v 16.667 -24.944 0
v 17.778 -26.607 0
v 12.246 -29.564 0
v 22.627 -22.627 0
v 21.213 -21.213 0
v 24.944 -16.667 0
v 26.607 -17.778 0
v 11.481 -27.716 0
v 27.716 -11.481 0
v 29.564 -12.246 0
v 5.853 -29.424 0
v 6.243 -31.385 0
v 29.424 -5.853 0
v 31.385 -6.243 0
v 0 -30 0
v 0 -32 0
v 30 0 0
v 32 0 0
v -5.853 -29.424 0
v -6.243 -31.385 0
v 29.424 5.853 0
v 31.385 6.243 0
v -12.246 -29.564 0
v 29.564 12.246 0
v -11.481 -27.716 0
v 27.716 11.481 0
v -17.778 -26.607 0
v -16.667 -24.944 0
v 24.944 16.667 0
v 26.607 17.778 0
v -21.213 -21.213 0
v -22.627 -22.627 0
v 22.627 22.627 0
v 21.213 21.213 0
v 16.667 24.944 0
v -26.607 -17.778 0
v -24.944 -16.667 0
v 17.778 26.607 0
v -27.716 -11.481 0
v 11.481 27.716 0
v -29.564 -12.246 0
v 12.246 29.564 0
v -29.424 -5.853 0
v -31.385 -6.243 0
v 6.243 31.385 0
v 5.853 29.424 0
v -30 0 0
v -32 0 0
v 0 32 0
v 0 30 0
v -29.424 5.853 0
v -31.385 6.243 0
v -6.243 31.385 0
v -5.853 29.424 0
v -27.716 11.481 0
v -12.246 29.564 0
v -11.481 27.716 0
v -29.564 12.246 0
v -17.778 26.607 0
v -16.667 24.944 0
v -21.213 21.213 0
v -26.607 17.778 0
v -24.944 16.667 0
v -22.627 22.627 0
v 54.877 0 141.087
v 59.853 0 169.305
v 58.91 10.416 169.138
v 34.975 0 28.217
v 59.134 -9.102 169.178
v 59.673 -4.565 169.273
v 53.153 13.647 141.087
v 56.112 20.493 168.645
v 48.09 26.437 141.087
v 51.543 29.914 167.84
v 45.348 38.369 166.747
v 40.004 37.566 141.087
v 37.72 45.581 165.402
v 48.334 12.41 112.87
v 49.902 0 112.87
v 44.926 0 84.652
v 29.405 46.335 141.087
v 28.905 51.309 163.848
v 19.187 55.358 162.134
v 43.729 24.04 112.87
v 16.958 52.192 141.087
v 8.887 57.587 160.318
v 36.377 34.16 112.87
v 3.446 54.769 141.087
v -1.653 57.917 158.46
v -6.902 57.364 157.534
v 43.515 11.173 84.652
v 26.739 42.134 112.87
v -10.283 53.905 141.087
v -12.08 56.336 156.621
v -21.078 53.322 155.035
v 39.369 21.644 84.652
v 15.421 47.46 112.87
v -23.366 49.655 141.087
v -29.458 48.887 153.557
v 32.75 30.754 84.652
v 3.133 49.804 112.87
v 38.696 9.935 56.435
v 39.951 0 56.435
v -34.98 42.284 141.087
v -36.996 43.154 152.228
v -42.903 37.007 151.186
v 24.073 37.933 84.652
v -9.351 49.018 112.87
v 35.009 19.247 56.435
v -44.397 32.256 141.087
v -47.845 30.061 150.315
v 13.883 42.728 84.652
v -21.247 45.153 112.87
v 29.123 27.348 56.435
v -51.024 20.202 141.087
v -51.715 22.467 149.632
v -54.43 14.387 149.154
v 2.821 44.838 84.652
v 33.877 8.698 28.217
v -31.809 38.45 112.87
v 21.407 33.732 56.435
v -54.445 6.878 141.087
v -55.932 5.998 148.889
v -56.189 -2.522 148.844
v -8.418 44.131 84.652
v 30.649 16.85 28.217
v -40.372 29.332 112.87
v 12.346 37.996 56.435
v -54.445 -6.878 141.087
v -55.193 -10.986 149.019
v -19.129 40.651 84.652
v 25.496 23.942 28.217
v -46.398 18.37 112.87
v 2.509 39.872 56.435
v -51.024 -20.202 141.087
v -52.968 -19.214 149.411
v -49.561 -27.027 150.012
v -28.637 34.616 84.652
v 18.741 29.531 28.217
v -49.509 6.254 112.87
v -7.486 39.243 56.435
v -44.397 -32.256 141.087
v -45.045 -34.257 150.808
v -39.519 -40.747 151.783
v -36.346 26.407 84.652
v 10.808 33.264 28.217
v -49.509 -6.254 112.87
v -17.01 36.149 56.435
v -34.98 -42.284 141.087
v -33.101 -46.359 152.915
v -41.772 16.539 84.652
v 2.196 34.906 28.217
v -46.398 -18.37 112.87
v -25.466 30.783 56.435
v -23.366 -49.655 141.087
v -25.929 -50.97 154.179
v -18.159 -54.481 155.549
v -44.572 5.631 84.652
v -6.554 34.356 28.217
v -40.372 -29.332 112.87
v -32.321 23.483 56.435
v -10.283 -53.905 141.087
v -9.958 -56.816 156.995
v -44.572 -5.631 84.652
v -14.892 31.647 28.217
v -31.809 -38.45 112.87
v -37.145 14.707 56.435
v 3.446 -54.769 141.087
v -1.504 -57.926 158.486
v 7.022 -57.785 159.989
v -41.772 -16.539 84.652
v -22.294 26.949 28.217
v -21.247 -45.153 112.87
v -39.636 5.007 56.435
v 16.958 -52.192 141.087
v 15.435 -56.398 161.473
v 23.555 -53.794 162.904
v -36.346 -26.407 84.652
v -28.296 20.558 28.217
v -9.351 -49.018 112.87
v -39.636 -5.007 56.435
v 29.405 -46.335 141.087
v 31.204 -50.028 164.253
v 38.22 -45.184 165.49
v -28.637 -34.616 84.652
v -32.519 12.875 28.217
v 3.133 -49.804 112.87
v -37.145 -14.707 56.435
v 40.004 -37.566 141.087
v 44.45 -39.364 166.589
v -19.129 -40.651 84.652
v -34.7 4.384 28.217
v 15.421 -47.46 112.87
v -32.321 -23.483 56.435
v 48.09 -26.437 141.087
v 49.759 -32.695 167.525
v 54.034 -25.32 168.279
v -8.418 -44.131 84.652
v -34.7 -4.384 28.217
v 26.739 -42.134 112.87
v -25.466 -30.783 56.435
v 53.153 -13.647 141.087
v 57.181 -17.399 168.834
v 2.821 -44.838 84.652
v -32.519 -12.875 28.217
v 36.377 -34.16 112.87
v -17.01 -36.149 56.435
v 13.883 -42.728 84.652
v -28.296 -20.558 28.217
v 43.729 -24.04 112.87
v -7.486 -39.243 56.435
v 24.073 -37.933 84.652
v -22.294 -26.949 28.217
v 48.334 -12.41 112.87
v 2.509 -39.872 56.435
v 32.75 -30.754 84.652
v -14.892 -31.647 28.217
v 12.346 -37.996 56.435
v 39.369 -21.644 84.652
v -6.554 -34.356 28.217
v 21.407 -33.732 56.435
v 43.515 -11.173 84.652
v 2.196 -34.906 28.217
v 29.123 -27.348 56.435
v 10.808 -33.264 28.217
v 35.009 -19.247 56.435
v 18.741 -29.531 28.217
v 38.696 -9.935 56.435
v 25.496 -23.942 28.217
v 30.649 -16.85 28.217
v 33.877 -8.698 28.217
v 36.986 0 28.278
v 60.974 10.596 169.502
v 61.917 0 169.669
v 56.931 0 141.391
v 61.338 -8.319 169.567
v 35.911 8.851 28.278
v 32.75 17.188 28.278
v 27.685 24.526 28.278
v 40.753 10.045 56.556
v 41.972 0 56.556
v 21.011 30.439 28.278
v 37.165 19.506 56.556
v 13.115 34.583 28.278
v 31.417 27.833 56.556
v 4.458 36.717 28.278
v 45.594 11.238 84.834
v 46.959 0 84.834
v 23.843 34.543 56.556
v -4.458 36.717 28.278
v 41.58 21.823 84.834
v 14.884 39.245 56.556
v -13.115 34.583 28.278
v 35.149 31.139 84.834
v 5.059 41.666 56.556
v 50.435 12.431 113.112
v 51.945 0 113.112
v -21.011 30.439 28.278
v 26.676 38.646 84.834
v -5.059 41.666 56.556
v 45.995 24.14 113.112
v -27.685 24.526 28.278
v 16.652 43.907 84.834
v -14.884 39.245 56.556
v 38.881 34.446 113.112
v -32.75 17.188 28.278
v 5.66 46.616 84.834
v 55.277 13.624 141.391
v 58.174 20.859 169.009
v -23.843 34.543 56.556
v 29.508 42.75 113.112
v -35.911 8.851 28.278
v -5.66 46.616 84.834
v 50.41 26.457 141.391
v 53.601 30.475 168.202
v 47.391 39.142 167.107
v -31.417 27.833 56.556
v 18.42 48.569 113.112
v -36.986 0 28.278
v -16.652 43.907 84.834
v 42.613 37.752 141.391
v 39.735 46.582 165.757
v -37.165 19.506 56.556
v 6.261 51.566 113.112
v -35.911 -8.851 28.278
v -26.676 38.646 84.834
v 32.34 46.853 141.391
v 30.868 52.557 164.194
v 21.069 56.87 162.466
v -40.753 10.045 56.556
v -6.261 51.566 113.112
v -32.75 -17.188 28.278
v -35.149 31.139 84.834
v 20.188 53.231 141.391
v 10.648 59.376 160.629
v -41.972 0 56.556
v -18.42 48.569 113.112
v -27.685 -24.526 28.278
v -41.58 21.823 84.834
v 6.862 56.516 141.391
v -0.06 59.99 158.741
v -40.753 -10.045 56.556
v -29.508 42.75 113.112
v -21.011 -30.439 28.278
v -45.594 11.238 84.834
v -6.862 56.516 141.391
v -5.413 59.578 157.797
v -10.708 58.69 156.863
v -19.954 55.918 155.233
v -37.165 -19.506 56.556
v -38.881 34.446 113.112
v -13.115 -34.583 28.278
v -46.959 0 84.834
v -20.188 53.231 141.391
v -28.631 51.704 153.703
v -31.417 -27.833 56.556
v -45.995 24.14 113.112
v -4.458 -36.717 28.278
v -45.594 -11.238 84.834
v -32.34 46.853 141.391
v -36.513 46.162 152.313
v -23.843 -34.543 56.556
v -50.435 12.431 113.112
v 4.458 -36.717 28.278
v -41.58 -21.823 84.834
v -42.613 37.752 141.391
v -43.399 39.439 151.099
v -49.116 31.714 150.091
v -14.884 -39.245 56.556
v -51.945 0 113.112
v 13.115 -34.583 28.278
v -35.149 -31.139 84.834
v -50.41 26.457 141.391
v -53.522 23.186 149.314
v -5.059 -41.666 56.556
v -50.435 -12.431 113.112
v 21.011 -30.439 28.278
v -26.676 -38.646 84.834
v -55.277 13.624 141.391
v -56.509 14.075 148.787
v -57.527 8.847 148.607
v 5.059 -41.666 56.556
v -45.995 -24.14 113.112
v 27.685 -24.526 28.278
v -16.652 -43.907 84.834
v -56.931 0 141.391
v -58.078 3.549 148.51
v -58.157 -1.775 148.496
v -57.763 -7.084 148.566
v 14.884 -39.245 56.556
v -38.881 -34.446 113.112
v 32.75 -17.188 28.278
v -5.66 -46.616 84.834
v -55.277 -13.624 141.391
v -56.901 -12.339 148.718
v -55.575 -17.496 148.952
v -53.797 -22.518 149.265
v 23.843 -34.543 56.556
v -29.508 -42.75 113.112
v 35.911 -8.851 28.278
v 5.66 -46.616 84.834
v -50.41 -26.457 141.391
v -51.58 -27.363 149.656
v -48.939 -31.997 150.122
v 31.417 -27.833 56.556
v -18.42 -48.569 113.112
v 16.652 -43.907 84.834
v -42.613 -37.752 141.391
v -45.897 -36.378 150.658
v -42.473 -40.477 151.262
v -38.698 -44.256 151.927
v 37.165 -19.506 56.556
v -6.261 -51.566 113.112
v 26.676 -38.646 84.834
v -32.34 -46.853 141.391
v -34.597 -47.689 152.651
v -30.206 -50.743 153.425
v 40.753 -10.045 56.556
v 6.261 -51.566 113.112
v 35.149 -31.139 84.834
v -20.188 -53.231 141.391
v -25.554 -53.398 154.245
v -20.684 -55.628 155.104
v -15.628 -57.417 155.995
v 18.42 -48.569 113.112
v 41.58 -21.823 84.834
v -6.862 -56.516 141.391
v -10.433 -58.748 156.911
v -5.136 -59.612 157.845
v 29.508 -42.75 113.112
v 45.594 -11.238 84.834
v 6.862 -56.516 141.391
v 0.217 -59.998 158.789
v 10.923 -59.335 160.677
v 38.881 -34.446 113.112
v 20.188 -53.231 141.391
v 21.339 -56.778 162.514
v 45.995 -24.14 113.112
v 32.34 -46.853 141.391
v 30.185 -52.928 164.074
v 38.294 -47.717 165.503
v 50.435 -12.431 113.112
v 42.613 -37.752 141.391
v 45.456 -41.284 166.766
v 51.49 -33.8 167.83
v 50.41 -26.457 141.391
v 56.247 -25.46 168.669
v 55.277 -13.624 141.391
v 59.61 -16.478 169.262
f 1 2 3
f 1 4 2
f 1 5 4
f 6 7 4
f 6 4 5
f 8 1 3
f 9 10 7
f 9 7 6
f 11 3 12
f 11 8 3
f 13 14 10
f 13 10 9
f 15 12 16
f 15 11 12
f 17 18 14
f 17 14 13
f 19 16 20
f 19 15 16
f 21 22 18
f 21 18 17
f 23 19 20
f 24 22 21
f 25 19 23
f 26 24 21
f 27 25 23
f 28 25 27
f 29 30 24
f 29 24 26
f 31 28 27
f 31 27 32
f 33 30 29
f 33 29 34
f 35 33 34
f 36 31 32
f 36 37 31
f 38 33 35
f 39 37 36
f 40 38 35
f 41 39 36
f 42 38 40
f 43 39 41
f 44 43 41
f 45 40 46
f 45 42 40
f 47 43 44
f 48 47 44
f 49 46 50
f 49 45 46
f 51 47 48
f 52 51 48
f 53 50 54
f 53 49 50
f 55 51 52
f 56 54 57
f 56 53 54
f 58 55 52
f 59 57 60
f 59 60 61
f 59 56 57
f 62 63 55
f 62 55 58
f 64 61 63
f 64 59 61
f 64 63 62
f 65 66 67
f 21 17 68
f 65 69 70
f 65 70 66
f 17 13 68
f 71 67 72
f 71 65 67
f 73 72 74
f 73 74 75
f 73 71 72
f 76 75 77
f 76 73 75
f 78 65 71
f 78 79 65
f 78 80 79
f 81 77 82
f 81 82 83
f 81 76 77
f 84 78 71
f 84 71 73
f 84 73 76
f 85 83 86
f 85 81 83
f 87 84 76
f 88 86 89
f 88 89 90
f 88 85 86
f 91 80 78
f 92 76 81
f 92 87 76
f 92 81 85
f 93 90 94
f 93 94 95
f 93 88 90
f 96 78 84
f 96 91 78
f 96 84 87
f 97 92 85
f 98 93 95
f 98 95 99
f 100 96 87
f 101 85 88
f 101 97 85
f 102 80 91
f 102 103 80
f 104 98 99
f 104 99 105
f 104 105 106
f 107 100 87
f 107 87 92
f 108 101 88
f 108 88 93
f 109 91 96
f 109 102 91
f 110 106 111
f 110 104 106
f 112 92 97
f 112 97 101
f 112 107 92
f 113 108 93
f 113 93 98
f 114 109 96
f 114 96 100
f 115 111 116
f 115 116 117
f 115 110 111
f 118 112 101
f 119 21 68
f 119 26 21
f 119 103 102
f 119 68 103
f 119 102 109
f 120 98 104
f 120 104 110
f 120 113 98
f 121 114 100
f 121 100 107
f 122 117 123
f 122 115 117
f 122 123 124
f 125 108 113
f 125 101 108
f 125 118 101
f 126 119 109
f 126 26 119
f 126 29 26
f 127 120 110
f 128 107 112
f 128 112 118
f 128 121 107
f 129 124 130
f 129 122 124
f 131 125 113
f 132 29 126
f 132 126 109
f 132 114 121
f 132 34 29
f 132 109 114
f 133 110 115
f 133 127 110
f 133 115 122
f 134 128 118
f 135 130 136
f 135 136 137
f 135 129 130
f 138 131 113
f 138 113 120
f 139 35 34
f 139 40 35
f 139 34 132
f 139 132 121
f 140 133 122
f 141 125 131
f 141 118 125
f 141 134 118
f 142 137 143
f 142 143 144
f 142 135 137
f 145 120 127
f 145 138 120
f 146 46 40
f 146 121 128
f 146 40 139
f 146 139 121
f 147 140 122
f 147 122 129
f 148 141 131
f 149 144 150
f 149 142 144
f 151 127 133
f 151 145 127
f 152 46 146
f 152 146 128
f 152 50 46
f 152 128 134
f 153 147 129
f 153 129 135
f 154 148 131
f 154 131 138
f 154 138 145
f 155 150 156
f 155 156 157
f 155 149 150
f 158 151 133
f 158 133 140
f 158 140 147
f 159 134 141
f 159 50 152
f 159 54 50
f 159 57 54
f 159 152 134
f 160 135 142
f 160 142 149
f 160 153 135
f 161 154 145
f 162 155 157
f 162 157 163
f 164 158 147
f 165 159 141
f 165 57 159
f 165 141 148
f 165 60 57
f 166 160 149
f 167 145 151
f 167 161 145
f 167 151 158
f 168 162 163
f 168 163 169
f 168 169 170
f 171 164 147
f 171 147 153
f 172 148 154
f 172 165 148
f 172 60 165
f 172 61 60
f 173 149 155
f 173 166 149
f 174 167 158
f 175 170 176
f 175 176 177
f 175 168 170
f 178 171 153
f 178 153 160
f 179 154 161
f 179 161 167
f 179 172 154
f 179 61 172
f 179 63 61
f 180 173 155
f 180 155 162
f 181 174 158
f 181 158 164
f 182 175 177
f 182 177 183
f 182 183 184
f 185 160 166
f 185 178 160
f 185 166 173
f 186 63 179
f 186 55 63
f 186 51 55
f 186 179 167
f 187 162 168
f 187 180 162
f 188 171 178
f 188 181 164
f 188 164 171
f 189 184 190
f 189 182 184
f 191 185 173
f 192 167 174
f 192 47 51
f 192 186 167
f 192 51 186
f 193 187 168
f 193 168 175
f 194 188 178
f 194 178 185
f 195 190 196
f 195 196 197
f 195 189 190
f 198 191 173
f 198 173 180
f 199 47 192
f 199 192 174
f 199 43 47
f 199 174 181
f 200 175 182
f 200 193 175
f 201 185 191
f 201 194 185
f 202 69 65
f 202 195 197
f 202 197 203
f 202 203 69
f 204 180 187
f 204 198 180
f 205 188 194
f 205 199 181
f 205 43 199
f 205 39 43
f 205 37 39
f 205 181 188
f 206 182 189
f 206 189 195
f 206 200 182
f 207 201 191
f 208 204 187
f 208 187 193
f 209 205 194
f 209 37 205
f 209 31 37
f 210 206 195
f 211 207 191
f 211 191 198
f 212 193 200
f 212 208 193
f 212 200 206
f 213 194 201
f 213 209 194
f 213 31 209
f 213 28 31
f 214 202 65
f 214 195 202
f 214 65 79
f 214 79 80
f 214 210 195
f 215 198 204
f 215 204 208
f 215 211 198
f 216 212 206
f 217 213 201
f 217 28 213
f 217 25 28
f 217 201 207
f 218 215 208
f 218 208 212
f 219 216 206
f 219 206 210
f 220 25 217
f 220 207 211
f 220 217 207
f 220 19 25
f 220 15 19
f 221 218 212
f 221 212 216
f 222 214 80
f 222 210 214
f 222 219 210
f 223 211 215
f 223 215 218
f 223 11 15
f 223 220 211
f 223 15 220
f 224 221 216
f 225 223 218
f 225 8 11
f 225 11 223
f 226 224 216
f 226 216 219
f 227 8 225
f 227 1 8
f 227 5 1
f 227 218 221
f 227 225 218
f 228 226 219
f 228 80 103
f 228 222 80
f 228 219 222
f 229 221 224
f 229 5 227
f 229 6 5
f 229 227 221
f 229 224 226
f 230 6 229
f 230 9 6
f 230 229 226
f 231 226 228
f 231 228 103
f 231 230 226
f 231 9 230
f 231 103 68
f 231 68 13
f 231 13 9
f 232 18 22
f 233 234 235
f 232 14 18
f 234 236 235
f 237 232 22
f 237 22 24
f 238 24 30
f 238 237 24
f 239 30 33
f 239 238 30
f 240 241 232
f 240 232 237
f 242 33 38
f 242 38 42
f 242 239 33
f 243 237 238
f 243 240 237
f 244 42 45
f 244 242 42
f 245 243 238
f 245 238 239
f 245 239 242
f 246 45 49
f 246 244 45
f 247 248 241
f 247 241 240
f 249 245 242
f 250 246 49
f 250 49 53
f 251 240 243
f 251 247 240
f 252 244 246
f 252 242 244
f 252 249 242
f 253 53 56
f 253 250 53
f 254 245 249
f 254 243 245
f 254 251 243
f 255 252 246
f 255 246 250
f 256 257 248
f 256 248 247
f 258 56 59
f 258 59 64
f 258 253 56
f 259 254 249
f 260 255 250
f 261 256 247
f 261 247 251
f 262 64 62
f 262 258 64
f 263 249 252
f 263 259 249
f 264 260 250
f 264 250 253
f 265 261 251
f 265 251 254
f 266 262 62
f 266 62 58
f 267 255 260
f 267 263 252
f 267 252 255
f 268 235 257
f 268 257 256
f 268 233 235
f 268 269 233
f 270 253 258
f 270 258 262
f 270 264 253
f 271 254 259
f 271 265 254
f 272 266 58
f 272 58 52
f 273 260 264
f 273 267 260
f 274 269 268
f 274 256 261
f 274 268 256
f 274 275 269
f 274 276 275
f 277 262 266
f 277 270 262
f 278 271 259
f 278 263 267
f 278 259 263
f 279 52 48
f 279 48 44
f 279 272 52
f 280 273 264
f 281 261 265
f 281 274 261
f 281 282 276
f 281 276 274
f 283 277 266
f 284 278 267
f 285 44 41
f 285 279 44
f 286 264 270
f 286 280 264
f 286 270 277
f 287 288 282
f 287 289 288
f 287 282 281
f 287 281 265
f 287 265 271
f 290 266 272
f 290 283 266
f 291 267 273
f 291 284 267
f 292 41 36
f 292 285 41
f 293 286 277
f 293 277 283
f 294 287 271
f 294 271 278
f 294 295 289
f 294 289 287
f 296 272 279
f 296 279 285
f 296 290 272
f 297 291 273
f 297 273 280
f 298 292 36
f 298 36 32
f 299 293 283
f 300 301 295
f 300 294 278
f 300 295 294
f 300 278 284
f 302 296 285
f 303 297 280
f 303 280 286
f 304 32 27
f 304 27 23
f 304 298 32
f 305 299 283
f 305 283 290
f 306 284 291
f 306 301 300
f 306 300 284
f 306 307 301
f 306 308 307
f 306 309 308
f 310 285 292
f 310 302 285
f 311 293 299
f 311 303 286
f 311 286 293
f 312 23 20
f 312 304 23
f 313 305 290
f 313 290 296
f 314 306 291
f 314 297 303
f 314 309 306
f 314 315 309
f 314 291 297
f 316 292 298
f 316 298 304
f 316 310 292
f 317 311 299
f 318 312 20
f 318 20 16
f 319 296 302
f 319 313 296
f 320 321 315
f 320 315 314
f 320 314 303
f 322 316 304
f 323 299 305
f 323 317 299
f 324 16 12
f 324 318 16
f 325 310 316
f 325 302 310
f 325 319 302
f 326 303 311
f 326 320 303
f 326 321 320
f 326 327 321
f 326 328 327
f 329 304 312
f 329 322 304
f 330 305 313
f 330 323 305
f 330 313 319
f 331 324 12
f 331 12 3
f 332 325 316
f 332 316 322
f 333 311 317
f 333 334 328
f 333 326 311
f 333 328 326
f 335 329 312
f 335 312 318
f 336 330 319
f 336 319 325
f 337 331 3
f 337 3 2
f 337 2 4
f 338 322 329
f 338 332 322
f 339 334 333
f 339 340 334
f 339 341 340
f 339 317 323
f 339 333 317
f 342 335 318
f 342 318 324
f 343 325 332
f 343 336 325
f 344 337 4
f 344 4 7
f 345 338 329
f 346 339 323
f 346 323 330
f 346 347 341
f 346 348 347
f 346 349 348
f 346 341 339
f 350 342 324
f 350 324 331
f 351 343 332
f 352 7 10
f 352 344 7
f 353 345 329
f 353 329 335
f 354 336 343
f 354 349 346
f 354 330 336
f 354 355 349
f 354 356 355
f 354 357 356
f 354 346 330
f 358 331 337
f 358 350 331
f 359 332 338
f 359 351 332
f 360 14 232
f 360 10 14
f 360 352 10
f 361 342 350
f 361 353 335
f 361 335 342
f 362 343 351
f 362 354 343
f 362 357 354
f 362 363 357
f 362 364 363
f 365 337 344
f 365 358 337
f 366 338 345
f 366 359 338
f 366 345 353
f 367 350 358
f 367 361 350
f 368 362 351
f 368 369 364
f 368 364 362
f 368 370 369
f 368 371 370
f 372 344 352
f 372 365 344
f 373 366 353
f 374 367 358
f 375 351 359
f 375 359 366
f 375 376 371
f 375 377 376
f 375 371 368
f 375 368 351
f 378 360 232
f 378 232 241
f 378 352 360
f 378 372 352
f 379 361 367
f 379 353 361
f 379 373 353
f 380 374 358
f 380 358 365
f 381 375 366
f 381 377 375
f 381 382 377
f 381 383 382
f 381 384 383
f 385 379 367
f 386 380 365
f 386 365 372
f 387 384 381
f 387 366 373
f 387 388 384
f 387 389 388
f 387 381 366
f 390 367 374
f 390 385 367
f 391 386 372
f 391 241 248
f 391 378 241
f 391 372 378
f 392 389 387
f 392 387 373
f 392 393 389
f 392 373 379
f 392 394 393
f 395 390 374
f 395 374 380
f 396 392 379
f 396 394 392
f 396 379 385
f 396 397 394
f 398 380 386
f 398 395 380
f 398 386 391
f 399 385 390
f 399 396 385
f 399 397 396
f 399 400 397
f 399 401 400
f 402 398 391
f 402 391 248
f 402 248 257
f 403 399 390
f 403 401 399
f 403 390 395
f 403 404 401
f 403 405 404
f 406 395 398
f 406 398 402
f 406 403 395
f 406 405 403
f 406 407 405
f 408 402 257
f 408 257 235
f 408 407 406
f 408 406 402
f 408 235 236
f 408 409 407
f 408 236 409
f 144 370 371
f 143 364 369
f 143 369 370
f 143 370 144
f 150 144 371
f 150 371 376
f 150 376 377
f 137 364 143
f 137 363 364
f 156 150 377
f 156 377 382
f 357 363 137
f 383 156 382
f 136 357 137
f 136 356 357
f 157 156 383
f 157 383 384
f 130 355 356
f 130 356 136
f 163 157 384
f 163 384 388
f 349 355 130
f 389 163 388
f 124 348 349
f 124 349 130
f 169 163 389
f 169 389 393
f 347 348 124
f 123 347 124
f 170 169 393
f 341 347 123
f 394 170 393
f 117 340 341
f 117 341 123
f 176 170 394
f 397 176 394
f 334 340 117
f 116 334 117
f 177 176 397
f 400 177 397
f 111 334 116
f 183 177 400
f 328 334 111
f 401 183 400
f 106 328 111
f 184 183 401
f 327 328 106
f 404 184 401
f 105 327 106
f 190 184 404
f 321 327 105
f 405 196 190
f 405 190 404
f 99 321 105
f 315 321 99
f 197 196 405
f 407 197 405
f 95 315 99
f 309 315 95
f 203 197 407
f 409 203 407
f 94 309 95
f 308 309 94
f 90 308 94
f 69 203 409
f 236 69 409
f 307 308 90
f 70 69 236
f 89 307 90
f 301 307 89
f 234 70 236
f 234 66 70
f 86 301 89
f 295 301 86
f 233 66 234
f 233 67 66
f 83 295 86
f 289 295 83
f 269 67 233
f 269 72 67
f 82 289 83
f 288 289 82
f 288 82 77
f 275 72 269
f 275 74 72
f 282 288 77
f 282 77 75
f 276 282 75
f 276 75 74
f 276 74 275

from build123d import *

# Parameters (mm, degrees)
BOX_W           = 200
BOX_H           = 199
BOX_DEPTH       = 200
BOX_PITCH_ANGLE = -10


with BuildPart() as cube:
    # Box → Box (new body)
    with BuildSketch(Plane.XY):
        with Locations((100, 99.5)):
            Rectangle(BOX_W, BOX_H)
    extrude(amount=BOX_DEPTH)


with BuildPart() as cube_1:
    # Box pitch: moved
    add(cube.part.rotate(Axis((0, 0, 0), (0, 1, 0)), BOX_PITCH_ANGLE))


with BuildPart() as cube_2:
    # Box placement: moved
    add(cube_1.part.moved(Location((-95, -94, 142))))


with BuildPart() as side_shade_64mm_base:
    # Sketch → Revolution (revolve)
    with BuildSketch(Plane.XZ):
        Polygon((32, 0), (61.975587, 170), (59.975587, 170), (30, 0), align=None)
    revolve(axis=Axis((0, 0, 0), (0, 0, 1)))

    # Cut: cut Cube
    add(cube_2.part, mode=Mode.SUBTRACT)


solid = side_shade_64mm_base.part
